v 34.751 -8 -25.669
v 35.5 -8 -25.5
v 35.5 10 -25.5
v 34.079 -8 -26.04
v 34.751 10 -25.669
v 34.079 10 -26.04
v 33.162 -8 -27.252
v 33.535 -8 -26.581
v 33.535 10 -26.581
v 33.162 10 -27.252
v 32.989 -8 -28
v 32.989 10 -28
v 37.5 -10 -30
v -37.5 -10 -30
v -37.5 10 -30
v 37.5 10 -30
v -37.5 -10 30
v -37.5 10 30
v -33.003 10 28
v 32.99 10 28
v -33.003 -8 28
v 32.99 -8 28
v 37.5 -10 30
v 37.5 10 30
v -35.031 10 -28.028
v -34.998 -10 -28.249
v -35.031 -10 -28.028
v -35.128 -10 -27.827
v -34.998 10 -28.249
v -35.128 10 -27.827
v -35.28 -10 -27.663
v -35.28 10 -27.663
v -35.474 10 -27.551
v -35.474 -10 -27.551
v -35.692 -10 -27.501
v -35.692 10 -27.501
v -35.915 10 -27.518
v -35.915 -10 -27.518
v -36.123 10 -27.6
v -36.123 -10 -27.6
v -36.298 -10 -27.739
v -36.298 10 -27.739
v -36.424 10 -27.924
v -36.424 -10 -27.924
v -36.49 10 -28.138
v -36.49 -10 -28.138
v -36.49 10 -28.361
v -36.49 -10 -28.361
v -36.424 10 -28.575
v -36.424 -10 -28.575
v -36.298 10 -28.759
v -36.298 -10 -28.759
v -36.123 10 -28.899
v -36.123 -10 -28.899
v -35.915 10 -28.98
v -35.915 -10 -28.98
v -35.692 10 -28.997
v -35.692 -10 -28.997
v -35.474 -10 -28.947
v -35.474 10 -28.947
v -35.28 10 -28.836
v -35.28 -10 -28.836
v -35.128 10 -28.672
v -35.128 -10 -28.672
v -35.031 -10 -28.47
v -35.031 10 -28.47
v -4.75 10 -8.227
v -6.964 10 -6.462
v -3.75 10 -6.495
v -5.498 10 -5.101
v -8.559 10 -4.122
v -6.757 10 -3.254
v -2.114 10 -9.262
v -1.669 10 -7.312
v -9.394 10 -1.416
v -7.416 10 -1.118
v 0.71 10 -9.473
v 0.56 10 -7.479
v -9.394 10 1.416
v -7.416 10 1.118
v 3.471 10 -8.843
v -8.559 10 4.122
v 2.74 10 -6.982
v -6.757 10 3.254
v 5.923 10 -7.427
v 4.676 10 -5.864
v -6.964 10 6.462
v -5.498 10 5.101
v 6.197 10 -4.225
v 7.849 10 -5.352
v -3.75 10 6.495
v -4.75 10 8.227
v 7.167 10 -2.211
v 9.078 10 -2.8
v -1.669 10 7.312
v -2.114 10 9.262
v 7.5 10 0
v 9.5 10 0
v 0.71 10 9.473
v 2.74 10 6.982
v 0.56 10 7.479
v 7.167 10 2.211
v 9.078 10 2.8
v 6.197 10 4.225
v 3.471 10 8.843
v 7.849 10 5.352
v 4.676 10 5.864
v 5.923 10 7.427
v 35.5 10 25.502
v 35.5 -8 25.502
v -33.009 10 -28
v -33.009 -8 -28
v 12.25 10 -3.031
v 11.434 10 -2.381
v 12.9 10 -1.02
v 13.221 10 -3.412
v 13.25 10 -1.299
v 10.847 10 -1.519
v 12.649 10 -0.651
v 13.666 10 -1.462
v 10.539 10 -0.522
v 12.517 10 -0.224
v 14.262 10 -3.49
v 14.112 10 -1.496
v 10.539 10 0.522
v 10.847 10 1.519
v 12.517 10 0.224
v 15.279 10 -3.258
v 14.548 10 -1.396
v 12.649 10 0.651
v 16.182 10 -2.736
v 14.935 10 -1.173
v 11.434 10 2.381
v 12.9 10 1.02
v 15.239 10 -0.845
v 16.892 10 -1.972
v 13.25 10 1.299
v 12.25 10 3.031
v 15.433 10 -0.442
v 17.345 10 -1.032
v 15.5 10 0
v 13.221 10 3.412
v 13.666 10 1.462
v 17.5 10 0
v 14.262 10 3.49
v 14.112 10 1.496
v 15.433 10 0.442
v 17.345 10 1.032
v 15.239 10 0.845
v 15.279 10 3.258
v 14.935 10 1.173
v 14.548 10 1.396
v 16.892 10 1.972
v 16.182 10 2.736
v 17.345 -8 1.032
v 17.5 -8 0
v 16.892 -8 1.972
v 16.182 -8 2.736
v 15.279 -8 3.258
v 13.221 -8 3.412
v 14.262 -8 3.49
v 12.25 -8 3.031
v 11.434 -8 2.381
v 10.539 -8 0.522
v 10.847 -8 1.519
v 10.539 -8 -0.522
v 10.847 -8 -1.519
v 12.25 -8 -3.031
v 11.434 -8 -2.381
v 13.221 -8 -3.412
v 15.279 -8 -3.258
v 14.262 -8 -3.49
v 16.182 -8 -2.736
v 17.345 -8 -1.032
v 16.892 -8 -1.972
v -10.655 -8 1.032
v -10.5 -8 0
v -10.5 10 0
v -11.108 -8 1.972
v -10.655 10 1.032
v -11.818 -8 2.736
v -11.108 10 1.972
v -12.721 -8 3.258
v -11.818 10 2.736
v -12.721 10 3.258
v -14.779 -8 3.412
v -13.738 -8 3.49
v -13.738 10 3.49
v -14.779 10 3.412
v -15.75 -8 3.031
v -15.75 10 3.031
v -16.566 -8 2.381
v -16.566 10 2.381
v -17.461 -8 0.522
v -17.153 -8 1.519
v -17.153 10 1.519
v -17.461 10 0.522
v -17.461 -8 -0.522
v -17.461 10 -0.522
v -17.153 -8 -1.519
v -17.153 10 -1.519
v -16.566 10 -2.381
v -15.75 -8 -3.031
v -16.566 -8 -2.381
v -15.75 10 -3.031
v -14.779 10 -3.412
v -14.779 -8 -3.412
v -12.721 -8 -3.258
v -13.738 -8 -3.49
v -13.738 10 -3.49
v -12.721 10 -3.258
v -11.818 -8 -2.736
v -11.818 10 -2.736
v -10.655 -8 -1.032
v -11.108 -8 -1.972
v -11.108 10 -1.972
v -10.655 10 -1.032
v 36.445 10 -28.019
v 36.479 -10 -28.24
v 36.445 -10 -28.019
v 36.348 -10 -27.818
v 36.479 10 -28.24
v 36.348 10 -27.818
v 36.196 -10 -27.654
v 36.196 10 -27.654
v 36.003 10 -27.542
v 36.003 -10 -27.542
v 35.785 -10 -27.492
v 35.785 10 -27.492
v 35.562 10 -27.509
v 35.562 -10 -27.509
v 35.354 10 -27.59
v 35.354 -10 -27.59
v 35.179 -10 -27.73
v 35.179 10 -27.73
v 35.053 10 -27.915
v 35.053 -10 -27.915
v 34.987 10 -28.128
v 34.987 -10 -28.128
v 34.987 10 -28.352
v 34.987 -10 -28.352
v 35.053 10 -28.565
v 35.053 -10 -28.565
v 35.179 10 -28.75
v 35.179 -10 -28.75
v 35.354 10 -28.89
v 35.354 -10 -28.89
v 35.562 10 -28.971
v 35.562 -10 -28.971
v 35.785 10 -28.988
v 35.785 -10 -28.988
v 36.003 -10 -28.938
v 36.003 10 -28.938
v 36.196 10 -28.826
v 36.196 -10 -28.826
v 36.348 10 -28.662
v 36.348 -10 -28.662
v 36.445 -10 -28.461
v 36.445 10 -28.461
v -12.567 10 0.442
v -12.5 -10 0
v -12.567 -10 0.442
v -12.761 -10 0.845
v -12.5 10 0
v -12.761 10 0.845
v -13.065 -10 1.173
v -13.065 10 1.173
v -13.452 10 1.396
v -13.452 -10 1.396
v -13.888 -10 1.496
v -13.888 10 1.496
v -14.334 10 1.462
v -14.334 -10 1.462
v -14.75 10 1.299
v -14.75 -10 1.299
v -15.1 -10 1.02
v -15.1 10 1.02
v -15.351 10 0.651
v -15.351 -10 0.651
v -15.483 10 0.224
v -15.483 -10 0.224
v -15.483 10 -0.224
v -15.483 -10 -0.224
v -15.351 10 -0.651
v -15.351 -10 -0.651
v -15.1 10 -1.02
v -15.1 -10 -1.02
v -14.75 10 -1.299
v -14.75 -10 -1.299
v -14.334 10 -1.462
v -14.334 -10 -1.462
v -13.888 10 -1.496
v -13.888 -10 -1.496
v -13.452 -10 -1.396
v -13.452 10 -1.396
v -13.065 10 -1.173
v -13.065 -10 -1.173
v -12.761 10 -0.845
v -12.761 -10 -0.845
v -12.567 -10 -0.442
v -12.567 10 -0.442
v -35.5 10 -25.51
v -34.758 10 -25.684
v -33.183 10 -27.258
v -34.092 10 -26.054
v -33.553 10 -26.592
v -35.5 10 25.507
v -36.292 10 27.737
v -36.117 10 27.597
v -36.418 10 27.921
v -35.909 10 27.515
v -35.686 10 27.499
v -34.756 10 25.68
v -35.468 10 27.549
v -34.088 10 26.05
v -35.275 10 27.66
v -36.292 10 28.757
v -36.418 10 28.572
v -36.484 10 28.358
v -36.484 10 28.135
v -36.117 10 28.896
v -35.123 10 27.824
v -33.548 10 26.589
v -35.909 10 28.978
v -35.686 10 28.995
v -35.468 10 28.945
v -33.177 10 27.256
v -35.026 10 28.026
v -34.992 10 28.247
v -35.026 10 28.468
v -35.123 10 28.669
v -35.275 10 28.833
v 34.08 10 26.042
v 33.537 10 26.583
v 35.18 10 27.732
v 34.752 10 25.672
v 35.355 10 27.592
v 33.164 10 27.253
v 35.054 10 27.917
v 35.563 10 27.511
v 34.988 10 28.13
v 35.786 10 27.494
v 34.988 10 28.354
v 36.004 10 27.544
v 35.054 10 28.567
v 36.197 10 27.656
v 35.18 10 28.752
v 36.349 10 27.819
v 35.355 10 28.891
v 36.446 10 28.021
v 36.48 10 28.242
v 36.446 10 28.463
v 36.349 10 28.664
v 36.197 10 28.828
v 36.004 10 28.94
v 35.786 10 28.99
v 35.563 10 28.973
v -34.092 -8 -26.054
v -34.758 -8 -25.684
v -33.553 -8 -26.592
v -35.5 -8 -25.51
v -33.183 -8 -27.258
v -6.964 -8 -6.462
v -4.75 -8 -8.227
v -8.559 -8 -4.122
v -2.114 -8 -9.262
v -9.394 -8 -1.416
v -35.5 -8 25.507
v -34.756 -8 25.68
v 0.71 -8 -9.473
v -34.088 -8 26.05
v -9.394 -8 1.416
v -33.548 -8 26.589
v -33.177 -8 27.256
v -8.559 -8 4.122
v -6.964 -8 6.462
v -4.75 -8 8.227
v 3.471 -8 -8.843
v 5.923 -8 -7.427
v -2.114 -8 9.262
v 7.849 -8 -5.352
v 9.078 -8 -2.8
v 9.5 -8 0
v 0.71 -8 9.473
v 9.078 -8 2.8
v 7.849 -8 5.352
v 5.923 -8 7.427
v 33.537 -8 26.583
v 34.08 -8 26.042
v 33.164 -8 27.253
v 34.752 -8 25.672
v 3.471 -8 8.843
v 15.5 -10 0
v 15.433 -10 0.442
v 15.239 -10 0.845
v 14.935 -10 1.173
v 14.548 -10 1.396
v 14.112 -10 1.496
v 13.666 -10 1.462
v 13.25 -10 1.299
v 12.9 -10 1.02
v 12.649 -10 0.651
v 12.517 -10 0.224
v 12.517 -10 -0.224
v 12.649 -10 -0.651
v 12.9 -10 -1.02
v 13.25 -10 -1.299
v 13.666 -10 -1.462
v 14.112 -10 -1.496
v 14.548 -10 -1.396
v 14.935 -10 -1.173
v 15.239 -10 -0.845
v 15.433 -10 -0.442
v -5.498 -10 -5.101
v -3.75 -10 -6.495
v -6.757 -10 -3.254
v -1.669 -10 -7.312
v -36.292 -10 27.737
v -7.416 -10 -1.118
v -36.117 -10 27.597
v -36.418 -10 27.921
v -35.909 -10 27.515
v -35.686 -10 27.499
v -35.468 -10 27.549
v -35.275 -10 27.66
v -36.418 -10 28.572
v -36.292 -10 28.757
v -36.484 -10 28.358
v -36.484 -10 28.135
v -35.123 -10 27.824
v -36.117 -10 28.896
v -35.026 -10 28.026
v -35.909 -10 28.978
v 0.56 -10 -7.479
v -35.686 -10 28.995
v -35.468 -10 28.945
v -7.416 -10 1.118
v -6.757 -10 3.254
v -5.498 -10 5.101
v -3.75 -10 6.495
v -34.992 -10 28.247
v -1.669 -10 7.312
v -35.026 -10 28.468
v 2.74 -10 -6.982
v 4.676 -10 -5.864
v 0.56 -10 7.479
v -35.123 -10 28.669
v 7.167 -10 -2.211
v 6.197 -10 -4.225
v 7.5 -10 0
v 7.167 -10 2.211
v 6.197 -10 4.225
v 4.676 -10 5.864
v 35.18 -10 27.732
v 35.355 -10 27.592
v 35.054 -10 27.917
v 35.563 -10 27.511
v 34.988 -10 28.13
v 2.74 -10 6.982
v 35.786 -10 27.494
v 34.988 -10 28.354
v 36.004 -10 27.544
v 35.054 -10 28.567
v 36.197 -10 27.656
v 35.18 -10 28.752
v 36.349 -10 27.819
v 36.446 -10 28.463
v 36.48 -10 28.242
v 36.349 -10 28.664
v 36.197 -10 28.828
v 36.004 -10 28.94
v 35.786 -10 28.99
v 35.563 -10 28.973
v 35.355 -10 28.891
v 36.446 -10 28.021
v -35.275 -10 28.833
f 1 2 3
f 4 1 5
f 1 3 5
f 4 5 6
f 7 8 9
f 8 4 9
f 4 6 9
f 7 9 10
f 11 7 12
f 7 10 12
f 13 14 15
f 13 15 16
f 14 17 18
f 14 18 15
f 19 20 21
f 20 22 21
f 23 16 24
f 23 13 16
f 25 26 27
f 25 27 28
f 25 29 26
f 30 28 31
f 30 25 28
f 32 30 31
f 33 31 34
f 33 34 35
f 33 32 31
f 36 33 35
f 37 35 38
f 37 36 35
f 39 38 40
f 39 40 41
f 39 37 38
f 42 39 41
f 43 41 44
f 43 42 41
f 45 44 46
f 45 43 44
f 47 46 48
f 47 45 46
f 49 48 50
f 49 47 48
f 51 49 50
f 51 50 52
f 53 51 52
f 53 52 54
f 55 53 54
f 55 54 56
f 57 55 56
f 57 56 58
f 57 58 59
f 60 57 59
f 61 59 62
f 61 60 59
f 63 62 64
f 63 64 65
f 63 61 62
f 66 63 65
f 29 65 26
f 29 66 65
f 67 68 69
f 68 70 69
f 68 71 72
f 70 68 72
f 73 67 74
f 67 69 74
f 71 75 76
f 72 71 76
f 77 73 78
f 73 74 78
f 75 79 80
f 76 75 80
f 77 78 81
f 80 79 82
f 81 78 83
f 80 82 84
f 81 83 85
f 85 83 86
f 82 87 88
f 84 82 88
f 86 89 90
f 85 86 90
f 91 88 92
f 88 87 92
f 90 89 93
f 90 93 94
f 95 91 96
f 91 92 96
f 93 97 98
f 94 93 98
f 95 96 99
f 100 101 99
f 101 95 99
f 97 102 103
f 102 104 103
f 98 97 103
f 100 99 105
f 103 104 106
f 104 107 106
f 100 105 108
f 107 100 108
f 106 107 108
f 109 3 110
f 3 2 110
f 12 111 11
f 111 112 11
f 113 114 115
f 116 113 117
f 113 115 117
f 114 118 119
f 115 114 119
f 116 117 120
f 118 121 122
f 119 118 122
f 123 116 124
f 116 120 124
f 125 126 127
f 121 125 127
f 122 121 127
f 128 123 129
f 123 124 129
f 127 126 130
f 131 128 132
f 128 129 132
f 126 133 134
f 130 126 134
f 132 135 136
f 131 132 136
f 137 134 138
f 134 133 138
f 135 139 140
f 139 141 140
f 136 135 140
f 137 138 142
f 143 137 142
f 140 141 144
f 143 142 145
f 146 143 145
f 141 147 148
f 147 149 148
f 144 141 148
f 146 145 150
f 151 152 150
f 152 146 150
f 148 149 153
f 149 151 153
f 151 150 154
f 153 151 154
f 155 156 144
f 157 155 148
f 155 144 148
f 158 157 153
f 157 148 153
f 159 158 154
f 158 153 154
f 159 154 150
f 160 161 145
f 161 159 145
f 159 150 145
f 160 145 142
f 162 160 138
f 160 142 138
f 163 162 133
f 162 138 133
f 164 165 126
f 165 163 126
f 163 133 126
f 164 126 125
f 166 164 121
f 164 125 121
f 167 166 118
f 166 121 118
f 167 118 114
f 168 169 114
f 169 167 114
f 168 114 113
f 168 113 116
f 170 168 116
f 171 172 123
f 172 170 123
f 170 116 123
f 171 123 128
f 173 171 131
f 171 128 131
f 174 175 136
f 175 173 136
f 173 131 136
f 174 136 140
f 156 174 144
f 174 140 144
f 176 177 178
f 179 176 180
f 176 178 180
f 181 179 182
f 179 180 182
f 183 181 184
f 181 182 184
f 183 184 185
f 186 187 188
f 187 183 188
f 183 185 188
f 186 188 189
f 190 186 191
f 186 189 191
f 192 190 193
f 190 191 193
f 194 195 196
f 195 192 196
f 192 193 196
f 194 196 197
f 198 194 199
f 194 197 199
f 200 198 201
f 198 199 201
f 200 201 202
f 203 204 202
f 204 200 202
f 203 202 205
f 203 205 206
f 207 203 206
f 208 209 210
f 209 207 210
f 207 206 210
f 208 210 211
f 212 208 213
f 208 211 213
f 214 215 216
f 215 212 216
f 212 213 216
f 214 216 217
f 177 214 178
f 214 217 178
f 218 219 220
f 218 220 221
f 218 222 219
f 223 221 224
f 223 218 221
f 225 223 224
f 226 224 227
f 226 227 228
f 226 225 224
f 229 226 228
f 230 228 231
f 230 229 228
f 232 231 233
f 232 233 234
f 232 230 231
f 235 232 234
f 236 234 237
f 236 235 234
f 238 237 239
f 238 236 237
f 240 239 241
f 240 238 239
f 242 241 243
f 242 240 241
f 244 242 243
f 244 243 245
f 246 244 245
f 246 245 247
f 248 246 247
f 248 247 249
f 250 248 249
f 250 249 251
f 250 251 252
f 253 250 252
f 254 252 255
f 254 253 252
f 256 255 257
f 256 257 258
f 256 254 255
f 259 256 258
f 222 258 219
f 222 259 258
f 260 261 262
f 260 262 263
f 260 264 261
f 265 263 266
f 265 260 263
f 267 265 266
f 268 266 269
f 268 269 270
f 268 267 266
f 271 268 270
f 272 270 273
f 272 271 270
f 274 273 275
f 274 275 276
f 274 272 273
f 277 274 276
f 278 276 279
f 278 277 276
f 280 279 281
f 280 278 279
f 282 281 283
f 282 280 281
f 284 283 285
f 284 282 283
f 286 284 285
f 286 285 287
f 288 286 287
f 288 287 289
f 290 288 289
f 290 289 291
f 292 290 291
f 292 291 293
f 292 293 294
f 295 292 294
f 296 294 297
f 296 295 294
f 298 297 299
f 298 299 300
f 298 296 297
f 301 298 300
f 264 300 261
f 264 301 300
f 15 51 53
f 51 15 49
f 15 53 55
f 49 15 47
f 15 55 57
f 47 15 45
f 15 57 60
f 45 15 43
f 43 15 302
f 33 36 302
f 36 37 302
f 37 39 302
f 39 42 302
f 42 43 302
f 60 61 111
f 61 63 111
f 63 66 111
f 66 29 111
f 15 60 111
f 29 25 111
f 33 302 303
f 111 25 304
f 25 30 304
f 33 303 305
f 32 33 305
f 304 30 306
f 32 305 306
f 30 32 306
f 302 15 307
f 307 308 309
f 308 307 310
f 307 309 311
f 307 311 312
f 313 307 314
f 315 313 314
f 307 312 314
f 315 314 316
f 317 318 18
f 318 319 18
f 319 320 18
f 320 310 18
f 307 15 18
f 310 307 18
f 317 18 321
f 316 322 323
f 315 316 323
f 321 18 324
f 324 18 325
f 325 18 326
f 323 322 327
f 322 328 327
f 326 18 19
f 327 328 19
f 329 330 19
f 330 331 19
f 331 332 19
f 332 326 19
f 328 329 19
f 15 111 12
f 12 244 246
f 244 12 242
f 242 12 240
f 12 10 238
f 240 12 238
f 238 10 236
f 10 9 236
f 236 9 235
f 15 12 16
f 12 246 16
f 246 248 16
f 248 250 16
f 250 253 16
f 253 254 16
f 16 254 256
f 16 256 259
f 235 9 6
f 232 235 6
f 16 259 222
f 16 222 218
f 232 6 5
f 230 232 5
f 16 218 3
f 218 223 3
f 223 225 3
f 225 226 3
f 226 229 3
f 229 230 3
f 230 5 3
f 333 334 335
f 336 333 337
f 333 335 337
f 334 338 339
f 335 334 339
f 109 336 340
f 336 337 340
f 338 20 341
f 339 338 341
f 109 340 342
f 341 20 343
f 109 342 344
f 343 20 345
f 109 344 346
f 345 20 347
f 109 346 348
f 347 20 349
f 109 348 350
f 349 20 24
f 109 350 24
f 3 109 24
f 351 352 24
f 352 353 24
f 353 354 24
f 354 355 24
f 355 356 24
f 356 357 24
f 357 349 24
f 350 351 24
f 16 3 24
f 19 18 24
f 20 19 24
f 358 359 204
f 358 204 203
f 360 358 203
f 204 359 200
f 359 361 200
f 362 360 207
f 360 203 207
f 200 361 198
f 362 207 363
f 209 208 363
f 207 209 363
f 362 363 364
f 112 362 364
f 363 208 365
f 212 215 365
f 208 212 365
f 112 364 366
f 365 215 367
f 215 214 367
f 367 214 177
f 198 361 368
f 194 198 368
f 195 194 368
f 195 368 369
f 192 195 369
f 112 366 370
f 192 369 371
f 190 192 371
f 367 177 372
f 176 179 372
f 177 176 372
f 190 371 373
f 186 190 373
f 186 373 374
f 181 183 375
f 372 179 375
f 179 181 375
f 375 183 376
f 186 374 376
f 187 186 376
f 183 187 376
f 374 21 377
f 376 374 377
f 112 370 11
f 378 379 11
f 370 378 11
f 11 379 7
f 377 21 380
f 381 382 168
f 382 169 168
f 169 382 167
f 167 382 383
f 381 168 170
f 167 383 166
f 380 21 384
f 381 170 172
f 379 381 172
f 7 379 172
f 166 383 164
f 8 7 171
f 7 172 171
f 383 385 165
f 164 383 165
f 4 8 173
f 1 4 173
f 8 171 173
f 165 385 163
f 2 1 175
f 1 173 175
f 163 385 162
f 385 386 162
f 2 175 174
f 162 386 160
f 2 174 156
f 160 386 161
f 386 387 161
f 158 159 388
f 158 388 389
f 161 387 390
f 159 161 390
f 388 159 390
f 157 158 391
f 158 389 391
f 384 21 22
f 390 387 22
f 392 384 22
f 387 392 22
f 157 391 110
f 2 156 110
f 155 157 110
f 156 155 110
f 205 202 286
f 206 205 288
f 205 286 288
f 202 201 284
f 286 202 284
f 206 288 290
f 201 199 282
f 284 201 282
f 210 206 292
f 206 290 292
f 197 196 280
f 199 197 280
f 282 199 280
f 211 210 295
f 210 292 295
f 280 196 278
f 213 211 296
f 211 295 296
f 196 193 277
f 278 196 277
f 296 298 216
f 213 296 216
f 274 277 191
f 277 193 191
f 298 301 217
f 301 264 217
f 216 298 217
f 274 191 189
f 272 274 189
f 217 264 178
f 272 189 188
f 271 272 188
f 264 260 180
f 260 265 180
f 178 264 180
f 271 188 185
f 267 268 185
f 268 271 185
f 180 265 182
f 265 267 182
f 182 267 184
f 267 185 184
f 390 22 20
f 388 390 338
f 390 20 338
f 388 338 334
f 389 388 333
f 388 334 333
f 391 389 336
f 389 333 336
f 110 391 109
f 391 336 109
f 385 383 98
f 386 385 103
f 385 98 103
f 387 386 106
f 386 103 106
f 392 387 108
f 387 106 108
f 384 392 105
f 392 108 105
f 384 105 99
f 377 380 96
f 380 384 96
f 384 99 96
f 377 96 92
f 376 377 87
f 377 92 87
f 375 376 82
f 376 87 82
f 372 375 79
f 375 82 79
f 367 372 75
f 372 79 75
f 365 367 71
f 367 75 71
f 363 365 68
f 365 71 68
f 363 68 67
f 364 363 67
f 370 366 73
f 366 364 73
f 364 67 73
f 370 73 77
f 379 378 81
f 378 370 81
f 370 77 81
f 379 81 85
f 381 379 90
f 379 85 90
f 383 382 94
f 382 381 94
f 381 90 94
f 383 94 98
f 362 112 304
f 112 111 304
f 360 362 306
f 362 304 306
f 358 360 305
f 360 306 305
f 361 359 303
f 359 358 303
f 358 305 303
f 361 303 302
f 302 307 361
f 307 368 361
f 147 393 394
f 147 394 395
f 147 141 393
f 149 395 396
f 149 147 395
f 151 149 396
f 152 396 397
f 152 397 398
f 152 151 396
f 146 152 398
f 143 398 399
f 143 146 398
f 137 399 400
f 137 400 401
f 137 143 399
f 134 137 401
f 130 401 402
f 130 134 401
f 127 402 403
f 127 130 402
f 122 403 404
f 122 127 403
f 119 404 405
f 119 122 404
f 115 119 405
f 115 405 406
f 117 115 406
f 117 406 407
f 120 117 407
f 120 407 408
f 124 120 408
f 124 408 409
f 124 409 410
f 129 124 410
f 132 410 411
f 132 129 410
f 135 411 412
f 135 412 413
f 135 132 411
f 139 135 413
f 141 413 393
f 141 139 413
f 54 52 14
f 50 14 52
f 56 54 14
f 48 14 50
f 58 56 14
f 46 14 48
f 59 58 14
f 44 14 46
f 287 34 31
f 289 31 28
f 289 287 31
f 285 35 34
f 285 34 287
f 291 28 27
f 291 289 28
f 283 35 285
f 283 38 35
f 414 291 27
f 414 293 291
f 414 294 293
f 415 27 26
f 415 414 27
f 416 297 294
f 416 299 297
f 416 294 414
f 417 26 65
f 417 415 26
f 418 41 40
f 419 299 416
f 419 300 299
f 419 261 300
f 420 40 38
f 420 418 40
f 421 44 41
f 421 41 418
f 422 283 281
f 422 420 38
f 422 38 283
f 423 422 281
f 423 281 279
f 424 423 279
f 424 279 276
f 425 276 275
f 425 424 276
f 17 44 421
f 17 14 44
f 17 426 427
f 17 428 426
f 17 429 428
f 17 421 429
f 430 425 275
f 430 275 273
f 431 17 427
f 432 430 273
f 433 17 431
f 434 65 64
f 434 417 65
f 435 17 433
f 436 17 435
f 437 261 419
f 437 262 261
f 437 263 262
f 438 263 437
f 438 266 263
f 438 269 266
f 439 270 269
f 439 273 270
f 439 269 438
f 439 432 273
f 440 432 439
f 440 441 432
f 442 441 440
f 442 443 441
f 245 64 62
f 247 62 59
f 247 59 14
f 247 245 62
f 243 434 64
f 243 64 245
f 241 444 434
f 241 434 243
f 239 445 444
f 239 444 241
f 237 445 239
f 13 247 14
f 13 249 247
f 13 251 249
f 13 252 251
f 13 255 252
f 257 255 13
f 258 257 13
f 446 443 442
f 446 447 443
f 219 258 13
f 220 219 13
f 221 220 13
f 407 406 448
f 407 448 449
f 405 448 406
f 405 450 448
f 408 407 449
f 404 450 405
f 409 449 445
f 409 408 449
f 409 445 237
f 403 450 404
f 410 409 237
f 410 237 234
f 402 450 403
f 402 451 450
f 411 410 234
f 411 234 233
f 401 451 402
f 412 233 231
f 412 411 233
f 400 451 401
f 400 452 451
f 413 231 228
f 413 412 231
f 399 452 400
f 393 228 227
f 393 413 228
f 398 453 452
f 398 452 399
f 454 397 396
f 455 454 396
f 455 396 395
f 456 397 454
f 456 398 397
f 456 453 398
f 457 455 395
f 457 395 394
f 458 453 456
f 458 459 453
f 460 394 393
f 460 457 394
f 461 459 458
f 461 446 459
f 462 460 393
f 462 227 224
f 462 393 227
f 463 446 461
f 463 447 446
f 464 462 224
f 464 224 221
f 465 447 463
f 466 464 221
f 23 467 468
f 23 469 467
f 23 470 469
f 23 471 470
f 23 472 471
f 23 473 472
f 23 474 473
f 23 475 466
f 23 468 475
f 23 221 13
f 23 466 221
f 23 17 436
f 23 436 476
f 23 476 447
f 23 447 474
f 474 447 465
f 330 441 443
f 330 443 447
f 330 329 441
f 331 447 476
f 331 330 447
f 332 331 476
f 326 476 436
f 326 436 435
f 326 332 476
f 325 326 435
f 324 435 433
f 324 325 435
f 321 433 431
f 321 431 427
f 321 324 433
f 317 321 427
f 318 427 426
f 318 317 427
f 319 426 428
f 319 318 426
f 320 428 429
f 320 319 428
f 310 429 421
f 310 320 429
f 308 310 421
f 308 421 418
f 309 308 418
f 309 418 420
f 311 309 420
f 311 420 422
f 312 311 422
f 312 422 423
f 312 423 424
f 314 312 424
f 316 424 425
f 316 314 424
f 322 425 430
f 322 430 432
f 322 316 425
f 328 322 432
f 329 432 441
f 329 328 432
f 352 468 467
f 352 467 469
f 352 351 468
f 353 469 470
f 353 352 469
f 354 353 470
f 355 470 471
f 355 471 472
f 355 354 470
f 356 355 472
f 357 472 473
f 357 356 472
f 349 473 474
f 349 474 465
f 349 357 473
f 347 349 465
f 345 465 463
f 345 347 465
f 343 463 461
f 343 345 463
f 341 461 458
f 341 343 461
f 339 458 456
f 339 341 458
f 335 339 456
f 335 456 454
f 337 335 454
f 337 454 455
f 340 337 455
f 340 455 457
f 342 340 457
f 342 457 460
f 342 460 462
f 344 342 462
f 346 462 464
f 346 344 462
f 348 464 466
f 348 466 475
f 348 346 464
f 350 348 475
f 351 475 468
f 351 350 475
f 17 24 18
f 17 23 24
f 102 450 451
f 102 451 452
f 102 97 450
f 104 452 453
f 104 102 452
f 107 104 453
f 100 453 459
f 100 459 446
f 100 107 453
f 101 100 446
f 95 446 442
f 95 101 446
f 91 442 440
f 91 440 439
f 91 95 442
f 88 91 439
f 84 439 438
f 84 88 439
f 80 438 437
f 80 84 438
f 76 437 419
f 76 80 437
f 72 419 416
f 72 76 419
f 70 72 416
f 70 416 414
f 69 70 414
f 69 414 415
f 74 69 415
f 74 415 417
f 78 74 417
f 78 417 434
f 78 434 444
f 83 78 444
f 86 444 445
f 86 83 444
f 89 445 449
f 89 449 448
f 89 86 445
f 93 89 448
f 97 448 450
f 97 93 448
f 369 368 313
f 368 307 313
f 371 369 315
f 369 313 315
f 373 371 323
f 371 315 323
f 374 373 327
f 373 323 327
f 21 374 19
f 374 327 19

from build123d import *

# Parameters (mm, degrees)
F0_R     = 0.75
F0_R_2   = 1.5
F0_R_3   = 7.5
F1_DEPTH = 10
F2_T     = -2


with BuildPart() as f1:
    # F0 (on Front) → F1 (new body, symmetric)
    with BuildSketch(Plane.XZ):
        Polygon((37.5, 29), (37.5, 30), (-36.5, 30), (-37.5, 30), (-37.5, -29), (-37.5, -29.021632), (-37.5, -30), (37.488481, -30), (37.5, -30), align=None)
        with Locations((-35.74789, -28.249304)):
            Circle(F0_R, mode=Mode.SUBTRACT)
        with Locations((35.728708, -28.240002)):
            Circle(F0_R, mode=Mode.SUBTRACT)
        with Locations((-14, 0)):
            Circle(F0_R_2, mode=Mode.SUBTRACT)
        with Locations((-35.742357, 28.246674)):
            Circle(F0_R, mode=Mode.SUBTRACT)
        Circle(F0_R_3, mode=Mode.SUBTRACT)
        with Locations((14, 0)):
            Circle(F0_R_2, mode=Mode.SUBTRACT)
        with Locations((35.729614, 28.241964)):
            Circle(F0_R, mode=Mode.SUBTRACT)
    extrude(amount=F1_DEPTH, both=True)

    # F2
    f2_openings = [f1.faces().sort_by_distance(p)[0] for p in [
        (0, 10, 29.039531),
    ]]
    offset(amount=F2_T, openings=f2_openings)


solid = f1.part
